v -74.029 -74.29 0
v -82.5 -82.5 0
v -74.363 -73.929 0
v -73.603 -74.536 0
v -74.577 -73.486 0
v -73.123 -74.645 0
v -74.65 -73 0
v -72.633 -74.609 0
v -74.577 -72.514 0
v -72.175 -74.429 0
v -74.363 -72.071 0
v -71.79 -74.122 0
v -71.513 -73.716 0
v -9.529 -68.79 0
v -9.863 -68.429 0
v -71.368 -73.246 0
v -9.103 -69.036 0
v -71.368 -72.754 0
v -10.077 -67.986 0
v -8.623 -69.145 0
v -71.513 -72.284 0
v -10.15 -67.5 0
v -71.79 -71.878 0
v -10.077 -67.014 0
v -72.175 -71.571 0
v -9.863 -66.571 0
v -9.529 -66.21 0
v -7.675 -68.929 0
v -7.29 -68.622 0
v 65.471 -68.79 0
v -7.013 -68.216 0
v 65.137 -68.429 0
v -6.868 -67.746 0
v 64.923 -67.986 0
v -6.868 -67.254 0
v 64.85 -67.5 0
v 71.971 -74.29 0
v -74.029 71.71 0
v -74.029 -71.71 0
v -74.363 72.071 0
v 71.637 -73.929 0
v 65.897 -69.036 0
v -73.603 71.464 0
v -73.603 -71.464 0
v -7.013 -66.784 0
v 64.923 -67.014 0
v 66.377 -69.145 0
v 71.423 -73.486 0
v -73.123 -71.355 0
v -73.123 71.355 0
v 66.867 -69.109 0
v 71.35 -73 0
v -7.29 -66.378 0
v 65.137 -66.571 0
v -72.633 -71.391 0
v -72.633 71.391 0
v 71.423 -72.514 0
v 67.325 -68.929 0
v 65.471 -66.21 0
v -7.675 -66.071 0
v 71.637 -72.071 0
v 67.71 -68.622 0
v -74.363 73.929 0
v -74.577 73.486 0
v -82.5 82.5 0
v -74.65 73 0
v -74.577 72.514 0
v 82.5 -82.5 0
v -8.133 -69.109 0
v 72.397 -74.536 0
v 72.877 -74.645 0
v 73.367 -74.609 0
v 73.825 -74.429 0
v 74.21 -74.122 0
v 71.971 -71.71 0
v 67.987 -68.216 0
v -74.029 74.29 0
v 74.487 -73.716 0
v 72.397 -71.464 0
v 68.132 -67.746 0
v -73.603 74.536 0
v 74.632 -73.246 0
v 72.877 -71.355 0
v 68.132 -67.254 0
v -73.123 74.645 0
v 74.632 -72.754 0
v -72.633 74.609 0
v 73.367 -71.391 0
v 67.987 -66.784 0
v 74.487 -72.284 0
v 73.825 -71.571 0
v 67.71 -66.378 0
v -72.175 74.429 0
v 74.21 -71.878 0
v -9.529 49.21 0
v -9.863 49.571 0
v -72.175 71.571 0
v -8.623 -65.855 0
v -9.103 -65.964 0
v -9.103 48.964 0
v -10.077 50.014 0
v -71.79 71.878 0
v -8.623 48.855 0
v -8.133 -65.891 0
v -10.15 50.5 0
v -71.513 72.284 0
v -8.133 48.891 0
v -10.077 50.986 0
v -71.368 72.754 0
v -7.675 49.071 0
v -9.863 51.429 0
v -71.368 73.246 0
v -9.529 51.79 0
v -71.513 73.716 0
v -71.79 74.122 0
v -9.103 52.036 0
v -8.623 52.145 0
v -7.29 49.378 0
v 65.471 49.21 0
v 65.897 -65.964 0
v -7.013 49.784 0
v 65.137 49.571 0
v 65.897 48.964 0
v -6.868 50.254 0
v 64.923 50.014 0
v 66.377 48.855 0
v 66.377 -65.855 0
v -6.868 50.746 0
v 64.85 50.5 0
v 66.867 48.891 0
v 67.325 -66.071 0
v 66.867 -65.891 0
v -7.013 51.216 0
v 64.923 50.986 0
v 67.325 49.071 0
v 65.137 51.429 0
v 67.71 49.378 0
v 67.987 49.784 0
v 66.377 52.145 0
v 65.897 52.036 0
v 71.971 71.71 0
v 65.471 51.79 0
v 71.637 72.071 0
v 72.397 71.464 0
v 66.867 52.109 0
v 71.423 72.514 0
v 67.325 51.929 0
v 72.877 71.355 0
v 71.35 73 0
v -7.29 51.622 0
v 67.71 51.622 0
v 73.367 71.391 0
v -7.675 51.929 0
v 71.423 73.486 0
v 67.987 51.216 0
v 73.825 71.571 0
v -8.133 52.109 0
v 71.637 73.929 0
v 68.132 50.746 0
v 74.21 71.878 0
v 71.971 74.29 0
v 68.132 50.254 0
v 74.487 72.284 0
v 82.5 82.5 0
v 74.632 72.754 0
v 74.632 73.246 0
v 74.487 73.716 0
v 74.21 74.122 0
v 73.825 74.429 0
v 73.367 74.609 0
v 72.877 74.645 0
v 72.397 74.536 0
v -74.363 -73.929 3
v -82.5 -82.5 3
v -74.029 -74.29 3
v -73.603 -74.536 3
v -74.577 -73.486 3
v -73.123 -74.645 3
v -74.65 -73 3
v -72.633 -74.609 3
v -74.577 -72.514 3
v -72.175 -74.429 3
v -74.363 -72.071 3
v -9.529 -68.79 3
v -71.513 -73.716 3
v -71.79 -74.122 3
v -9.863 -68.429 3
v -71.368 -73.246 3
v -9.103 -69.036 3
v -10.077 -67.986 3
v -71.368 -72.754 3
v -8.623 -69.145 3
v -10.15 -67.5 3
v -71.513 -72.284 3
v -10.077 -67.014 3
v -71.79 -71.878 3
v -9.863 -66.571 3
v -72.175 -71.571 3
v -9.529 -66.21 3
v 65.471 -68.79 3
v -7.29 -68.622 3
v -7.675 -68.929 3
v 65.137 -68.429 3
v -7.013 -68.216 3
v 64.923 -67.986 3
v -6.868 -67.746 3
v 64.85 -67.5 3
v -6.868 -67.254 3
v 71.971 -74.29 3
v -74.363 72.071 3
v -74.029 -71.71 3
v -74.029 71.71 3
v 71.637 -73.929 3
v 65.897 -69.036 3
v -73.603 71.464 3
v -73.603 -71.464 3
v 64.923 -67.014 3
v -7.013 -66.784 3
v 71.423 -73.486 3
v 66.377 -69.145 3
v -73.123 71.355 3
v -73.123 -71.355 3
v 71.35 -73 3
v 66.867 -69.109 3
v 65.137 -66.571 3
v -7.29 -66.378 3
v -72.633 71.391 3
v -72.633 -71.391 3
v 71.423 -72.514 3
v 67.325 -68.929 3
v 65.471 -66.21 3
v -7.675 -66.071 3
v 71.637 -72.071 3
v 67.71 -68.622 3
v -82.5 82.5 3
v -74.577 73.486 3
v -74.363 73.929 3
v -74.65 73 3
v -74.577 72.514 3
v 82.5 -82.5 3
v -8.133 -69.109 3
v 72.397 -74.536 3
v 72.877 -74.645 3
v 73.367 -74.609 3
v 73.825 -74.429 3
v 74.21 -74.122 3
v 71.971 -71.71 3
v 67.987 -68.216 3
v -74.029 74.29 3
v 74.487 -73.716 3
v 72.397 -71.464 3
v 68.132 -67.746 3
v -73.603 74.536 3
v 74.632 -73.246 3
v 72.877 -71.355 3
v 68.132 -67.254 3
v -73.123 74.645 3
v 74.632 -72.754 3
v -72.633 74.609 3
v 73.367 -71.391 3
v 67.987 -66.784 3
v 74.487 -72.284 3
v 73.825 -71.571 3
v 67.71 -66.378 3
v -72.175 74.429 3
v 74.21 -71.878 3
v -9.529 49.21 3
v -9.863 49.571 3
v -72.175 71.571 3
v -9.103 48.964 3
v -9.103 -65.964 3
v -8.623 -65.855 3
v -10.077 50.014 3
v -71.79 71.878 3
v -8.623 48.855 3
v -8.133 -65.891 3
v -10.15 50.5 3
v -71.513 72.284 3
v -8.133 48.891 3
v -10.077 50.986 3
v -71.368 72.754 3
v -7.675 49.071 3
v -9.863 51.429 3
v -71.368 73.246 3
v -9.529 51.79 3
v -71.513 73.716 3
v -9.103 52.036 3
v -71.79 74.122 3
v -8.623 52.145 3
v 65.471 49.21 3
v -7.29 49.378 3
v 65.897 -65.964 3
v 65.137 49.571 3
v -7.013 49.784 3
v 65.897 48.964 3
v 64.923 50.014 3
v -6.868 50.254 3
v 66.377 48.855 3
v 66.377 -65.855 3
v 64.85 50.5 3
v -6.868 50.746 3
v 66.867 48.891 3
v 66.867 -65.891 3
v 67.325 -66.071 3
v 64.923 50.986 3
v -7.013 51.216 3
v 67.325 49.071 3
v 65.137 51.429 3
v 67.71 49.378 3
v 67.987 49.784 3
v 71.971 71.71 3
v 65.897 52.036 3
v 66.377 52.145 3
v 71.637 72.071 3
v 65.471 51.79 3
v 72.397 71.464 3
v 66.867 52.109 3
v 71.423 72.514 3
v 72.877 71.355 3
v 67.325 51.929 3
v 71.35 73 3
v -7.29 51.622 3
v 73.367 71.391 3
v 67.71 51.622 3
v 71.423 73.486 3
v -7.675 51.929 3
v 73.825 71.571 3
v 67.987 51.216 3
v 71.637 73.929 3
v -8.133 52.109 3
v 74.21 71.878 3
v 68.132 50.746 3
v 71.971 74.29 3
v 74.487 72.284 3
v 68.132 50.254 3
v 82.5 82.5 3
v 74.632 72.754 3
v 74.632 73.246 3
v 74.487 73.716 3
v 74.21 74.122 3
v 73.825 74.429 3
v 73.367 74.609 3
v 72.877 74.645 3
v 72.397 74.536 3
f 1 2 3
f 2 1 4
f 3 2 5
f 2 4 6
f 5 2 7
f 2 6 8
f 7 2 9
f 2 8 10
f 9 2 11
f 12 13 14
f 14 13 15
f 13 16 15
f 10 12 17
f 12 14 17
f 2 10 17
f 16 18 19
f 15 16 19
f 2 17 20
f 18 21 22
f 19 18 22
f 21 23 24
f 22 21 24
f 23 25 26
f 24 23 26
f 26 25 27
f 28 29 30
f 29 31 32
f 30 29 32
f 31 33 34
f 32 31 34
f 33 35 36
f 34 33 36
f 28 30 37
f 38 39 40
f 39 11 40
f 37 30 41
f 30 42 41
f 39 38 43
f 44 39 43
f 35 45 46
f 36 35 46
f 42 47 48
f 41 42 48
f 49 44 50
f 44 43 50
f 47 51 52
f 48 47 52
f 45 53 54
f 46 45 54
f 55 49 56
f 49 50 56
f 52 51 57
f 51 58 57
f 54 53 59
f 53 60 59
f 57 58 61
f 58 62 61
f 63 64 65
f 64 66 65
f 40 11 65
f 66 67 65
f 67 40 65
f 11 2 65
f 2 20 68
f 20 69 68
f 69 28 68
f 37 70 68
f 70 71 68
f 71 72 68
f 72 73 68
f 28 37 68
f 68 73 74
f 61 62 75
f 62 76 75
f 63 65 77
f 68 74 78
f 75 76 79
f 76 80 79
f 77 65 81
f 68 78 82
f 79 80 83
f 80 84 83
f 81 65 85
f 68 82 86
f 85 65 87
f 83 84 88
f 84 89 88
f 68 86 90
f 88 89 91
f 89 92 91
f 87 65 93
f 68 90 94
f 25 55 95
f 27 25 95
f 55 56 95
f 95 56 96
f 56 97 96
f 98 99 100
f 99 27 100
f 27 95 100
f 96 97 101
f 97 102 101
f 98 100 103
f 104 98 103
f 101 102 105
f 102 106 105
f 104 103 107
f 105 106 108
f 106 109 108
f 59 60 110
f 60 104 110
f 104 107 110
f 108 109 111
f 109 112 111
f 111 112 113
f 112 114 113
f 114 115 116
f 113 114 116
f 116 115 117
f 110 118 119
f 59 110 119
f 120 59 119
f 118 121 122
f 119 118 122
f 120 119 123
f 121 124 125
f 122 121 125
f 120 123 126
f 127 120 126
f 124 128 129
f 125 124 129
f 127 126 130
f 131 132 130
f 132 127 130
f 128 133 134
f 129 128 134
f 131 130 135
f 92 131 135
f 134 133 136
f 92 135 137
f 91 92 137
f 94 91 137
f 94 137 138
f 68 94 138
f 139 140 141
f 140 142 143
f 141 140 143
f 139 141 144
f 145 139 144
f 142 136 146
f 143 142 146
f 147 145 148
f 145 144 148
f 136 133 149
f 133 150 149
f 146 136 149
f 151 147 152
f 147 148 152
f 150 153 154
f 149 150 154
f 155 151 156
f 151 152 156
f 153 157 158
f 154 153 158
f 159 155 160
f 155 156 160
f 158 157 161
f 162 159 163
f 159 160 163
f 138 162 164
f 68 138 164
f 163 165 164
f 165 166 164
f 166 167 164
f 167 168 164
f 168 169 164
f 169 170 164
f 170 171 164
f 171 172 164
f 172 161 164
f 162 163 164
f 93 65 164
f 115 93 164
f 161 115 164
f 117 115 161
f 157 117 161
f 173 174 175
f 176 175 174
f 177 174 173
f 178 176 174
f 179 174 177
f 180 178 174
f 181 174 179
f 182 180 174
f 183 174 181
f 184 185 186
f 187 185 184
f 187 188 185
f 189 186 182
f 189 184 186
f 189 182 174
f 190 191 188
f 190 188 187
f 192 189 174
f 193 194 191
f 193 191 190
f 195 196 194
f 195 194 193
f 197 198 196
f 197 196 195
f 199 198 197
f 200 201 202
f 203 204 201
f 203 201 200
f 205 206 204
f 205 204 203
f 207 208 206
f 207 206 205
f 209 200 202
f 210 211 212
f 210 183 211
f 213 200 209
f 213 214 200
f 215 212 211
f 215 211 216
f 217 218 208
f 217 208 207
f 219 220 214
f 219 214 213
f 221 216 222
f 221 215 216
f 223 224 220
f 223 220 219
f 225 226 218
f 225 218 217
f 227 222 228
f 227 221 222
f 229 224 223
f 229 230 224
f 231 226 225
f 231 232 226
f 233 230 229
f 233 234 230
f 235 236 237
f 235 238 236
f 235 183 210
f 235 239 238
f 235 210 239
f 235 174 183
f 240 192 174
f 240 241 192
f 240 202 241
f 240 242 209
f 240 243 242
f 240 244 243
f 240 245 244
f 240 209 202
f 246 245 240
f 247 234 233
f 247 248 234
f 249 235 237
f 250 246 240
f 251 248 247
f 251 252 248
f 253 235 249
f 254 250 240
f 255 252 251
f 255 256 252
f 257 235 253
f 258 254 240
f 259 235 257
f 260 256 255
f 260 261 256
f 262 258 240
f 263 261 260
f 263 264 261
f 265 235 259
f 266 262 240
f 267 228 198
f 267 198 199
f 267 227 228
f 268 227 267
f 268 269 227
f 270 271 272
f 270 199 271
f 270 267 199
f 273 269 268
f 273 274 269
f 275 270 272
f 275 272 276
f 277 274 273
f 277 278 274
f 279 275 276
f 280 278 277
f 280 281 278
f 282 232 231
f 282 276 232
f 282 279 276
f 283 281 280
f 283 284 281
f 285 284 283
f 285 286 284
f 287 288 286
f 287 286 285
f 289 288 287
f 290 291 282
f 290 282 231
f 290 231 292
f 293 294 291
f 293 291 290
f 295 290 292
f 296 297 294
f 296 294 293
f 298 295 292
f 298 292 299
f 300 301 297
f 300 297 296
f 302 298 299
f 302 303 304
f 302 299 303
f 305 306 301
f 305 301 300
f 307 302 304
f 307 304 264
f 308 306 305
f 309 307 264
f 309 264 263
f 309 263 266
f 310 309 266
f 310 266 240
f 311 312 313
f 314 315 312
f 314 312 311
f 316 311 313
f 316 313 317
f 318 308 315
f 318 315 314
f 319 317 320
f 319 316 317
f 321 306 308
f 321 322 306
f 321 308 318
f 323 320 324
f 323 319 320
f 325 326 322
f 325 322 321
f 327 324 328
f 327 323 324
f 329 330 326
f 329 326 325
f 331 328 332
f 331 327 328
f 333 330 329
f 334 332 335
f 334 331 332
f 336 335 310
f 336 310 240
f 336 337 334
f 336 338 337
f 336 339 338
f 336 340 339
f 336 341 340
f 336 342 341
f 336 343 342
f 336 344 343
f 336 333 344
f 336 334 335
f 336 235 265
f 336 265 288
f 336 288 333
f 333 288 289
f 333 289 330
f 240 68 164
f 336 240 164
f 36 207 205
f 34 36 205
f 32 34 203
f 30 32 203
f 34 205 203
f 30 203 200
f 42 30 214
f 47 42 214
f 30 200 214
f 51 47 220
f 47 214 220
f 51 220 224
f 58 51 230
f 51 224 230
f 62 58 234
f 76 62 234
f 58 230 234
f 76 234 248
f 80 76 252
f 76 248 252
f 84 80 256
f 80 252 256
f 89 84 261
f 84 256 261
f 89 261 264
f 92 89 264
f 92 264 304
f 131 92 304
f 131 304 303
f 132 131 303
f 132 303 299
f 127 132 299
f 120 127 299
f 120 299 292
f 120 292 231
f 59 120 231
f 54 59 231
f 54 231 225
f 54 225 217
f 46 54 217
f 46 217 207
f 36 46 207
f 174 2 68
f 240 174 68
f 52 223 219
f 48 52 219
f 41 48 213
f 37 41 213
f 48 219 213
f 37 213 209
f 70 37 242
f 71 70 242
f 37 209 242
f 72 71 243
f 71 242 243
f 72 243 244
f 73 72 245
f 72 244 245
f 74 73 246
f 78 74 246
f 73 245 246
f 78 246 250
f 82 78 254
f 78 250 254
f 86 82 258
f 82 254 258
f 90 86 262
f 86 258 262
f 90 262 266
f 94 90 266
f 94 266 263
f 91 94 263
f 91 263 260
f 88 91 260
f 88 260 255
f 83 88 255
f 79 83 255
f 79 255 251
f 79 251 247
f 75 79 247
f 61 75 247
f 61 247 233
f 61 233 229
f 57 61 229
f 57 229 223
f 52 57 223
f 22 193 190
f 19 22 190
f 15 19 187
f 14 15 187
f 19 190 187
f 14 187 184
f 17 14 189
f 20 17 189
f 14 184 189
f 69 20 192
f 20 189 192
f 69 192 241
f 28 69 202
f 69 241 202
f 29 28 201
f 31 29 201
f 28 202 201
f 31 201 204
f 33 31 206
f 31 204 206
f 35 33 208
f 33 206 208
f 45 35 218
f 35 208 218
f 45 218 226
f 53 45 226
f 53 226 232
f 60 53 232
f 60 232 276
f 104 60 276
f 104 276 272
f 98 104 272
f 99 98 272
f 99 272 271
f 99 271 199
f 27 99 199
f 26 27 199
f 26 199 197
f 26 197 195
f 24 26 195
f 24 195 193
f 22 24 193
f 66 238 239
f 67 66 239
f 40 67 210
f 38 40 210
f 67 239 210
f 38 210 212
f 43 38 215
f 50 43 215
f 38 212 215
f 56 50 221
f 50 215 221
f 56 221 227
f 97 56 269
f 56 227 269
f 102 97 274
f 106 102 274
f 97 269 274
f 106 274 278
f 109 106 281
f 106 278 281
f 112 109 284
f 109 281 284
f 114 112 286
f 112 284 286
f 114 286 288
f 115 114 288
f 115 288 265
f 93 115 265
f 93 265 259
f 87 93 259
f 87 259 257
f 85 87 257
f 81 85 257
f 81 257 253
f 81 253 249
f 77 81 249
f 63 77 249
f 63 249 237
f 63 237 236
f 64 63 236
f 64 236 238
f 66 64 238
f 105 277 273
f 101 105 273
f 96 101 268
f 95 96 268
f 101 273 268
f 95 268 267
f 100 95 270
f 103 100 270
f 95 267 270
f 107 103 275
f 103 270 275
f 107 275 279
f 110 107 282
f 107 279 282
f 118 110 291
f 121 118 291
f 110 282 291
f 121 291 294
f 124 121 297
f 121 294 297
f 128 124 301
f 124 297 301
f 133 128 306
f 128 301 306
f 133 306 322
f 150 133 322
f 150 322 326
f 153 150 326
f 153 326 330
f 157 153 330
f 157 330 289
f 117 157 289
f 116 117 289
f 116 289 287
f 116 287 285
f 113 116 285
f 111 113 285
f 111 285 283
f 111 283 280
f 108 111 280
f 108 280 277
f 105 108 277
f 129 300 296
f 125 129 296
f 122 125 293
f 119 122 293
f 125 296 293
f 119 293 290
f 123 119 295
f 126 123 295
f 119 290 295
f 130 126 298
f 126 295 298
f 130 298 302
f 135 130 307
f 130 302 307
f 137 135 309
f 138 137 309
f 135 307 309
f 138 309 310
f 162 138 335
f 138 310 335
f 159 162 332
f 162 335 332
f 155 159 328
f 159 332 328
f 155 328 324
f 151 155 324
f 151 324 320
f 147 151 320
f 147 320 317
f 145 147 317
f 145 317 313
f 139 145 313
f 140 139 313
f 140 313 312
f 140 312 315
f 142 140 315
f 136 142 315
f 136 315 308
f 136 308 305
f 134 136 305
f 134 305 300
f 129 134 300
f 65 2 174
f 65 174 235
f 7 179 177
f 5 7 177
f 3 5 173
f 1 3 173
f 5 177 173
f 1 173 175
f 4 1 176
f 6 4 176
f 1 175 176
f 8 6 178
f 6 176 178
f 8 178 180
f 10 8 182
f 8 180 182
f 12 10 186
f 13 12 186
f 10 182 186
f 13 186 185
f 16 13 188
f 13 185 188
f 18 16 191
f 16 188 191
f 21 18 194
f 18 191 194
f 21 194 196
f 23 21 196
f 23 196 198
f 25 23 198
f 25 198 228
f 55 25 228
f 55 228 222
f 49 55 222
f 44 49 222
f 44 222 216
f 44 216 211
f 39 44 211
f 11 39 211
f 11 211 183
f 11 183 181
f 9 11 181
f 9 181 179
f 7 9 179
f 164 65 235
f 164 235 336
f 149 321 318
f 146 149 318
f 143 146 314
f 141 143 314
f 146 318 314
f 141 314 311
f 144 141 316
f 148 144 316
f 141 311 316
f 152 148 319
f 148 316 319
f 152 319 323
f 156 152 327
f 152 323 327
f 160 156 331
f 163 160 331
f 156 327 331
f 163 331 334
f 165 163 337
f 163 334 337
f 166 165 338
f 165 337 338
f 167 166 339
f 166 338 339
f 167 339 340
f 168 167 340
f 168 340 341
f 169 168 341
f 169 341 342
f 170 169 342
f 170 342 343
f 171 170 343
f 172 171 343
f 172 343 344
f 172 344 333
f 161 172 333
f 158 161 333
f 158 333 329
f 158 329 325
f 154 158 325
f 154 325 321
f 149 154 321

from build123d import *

# Parameters (mm, degrees)
F0_W     = 165
F0_H     = 165
F1_DEPTH = 3
F2_D     = 3.3
F2_DEPTH = 15
F2_TIP   = 0.9914200214


with BuildPart() as f1:
    # F0 (on Top) → F1 (new body)
    with BuildSketch(Plane.XY):
        Rectangle(F0_W, F0_H)
    extrude(amount=F1_DEPTH)

    # F2
    with Locations(Plane(origin=(0, 0, 0), x_dir=(1, 0, 0), z_dir=(0, 0, -1))):
        with Locations((-73, -73), (73, -73), (-8.5, -50.5), (66.5, -50.5), (66.5, 67.5), (-8.5, 67.5), (73, 73), (-73, 73)):
            Hole(F2_D / 2, depth=F2_DEPTH)
            with Locations((0, 0, -(F2_DEPTH + F2_TIP / 2))):  # 118° drill point
                Cone(0, F2_D / 2, F2_TIP, mode=Mode.SUBTRACT)


solid = f1.part
